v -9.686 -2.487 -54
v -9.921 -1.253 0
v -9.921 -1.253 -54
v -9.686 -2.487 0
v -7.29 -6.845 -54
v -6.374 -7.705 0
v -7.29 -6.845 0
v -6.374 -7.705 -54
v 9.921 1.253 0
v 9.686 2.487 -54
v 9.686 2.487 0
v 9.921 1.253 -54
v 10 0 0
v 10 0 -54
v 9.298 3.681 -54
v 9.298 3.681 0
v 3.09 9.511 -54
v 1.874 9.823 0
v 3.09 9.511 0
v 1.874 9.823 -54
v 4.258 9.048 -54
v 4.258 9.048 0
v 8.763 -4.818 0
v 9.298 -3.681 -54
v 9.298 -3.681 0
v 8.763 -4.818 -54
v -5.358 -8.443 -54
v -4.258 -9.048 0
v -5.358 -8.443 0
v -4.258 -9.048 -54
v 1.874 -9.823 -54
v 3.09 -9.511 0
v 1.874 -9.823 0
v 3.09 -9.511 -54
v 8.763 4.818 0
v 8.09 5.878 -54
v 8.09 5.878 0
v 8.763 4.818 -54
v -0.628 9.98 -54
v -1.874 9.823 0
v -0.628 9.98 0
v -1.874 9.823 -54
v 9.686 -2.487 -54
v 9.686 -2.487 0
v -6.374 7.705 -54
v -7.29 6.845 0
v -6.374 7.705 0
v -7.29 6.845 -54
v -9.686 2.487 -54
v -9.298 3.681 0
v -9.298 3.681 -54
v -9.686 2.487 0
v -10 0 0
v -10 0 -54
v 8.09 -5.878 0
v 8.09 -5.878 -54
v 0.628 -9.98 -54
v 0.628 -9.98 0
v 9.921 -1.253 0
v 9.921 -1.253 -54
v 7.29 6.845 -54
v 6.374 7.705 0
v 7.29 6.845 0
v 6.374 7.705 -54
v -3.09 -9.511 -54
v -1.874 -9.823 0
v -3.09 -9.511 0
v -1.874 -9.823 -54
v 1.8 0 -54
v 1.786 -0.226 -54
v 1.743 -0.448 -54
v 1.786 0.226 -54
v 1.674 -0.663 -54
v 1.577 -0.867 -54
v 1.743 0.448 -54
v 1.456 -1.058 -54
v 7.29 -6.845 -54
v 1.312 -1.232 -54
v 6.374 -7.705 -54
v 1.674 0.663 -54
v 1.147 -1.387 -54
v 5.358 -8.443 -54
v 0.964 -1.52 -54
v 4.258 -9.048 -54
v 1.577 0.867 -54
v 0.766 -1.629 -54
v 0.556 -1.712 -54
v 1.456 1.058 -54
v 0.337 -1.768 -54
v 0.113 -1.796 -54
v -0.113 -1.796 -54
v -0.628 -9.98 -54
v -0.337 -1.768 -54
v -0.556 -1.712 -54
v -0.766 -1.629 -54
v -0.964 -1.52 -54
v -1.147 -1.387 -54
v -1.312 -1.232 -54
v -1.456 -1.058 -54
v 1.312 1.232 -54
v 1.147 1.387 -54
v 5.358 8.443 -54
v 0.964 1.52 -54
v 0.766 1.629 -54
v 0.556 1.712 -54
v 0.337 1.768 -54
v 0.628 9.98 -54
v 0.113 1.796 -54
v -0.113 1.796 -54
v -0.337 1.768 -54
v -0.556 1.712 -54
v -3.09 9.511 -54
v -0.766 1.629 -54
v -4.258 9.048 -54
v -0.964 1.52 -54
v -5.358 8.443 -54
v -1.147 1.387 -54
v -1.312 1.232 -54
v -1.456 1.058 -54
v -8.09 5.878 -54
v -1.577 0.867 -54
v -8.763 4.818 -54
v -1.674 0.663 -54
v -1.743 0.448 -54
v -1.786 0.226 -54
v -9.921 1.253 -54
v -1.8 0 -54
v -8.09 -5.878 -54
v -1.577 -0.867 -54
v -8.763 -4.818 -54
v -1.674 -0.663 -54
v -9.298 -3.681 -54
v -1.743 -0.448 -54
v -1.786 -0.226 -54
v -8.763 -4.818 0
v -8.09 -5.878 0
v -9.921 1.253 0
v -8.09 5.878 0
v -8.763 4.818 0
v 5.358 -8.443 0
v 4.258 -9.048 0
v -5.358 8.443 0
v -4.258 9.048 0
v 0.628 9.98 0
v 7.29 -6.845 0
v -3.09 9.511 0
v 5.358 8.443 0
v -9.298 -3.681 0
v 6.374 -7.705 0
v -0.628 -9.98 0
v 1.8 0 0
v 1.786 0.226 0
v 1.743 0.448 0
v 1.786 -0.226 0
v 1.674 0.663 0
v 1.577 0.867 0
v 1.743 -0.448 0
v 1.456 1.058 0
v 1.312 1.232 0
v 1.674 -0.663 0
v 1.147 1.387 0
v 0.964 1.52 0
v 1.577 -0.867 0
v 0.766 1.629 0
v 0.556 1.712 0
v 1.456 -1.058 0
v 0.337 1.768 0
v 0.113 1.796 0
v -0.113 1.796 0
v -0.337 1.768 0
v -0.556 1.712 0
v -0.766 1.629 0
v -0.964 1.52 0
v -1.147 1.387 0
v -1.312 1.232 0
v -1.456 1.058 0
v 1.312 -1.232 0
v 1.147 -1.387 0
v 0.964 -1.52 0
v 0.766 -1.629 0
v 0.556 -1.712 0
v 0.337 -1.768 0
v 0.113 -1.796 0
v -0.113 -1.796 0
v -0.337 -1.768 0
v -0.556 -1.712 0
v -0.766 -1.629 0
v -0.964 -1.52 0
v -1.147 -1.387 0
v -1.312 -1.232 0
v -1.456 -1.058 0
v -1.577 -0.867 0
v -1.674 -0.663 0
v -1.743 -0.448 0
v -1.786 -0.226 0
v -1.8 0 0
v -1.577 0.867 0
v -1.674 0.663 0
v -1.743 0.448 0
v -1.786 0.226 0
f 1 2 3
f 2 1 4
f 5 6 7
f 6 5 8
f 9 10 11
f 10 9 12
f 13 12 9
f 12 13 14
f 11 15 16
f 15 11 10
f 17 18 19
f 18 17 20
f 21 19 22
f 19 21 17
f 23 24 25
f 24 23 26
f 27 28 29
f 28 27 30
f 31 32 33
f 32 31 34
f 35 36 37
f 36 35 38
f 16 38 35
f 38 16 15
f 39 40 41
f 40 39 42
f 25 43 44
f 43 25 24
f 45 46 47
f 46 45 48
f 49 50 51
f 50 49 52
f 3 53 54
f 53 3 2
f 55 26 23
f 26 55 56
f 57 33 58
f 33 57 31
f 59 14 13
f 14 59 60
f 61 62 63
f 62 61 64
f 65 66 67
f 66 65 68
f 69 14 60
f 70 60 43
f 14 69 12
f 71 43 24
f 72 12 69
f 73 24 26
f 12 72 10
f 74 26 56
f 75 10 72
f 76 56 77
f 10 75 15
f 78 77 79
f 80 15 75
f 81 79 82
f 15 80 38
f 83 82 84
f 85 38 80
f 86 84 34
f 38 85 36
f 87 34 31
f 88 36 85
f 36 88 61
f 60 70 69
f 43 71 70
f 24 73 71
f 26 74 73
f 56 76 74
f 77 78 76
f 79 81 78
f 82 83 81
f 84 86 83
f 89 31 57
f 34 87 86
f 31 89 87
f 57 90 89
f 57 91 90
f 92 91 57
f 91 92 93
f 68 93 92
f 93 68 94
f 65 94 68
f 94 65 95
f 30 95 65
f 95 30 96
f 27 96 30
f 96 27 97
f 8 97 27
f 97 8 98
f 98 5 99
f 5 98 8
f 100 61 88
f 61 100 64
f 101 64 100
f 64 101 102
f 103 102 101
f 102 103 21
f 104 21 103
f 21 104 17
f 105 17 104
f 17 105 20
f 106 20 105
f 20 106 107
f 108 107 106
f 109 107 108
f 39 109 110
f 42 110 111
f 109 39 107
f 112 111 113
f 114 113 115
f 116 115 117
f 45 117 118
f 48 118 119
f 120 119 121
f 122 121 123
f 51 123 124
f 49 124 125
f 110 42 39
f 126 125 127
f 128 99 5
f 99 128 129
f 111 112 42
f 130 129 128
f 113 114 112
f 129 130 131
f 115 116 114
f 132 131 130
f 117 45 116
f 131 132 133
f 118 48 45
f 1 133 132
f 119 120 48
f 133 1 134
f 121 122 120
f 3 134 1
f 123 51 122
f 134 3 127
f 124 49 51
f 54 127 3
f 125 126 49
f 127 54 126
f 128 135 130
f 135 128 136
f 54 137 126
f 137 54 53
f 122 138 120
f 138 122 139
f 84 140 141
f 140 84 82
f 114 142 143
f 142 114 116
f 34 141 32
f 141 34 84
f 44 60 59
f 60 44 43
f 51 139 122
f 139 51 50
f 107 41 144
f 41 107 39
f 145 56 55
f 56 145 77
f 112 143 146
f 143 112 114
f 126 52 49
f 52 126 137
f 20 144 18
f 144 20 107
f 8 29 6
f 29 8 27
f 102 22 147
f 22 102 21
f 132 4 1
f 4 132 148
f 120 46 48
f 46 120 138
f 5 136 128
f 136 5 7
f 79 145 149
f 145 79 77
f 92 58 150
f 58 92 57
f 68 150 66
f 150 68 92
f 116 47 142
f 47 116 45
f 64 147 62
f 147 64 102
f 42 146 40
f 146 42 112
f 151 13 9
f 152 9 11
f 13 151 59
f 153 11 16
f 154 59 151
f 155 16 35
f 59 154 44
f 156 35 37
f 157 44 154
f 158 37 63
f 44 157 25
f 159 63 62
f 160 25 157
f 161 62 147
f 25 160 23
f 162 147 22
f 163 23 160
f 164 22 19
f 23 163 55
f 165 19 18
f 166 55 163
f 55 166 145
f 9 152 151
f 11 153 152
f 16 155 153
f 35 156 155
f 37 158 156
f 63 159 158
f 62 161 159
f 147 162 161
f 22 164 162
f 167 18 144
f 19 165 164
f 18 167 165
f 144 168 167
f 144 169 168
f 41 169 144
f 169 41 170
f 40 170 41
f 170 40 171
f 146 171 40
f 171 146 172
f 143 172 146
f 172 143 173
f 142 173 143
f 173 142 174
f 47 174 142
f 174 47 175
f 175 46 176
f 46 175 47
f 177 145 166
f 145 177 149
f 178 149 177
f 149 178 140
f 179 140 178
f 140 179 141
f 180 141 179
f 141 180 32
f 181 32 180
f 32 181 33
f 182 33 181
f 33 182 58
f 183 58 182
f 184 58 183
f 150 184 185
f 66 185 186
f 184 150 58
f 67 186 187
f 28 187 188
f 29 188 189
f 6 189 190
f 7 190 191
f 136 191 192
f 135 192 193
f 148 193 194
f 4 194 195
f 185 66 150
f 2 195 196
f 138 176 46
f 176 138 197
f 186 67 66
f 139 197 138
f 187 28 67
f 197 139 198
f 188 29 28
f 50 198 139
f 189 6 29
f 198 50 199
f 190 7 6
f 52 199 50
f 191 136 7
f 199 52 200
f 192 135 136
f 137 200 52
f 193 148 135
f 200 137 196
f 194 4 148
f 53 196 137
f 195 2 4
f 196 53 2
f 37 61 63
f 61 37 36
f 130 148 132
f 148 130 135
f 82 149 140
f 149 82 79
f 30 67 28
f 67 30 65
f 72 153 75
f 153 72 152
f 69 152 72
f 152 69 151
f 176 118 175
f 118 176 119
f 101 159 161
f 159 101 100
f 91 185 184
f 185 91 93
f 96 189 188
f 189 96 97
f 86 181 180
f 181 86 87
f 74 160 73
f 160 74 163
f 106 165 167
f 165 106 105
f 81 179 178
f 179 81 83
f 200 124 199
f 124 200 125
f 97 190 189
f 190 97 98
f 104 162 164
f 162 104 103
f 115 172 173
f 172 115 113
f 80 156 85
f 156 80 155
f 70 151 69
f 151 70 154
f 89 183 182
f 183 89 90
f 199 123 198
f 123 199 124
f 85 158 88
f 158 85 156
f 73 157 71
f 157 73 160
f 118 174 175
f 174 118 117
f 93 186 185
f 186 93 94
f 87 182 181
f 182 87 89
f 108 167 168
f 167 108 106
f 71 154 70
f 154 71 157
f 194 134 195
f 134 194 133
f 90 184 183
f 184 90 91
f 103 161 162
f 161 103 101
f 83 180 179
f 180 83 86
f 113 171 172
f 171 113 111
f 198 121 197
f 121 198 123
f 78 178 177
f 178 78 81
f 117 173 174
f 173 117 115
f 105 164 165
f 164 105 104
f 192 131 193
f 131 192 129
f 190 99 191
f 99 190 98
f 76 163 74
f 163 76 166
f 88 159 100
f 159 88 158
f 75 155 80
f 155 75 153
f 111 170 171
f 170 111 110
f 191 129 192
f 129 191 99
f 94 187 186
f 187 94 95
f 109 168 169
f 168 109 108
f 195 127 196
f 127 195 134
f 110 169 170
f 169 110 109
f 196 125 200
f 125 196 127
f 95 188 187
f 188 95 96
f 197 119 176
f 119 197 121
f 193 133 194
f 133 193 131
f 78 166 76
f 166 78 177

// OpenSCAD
$fn = 50;


difference() {
	union() {
		translate(v = [0, 0, -54.0000000000]) {
			cylinder(h = 54, r = 10.0000000000);
		}
		cylinder(h = 0, r = 19.0000000000);
	}
	union() {
		#translate(v = [0, 0, -54]) {
			cylinder(h = 54, r = 1.8000000000);
		}
	}
}
